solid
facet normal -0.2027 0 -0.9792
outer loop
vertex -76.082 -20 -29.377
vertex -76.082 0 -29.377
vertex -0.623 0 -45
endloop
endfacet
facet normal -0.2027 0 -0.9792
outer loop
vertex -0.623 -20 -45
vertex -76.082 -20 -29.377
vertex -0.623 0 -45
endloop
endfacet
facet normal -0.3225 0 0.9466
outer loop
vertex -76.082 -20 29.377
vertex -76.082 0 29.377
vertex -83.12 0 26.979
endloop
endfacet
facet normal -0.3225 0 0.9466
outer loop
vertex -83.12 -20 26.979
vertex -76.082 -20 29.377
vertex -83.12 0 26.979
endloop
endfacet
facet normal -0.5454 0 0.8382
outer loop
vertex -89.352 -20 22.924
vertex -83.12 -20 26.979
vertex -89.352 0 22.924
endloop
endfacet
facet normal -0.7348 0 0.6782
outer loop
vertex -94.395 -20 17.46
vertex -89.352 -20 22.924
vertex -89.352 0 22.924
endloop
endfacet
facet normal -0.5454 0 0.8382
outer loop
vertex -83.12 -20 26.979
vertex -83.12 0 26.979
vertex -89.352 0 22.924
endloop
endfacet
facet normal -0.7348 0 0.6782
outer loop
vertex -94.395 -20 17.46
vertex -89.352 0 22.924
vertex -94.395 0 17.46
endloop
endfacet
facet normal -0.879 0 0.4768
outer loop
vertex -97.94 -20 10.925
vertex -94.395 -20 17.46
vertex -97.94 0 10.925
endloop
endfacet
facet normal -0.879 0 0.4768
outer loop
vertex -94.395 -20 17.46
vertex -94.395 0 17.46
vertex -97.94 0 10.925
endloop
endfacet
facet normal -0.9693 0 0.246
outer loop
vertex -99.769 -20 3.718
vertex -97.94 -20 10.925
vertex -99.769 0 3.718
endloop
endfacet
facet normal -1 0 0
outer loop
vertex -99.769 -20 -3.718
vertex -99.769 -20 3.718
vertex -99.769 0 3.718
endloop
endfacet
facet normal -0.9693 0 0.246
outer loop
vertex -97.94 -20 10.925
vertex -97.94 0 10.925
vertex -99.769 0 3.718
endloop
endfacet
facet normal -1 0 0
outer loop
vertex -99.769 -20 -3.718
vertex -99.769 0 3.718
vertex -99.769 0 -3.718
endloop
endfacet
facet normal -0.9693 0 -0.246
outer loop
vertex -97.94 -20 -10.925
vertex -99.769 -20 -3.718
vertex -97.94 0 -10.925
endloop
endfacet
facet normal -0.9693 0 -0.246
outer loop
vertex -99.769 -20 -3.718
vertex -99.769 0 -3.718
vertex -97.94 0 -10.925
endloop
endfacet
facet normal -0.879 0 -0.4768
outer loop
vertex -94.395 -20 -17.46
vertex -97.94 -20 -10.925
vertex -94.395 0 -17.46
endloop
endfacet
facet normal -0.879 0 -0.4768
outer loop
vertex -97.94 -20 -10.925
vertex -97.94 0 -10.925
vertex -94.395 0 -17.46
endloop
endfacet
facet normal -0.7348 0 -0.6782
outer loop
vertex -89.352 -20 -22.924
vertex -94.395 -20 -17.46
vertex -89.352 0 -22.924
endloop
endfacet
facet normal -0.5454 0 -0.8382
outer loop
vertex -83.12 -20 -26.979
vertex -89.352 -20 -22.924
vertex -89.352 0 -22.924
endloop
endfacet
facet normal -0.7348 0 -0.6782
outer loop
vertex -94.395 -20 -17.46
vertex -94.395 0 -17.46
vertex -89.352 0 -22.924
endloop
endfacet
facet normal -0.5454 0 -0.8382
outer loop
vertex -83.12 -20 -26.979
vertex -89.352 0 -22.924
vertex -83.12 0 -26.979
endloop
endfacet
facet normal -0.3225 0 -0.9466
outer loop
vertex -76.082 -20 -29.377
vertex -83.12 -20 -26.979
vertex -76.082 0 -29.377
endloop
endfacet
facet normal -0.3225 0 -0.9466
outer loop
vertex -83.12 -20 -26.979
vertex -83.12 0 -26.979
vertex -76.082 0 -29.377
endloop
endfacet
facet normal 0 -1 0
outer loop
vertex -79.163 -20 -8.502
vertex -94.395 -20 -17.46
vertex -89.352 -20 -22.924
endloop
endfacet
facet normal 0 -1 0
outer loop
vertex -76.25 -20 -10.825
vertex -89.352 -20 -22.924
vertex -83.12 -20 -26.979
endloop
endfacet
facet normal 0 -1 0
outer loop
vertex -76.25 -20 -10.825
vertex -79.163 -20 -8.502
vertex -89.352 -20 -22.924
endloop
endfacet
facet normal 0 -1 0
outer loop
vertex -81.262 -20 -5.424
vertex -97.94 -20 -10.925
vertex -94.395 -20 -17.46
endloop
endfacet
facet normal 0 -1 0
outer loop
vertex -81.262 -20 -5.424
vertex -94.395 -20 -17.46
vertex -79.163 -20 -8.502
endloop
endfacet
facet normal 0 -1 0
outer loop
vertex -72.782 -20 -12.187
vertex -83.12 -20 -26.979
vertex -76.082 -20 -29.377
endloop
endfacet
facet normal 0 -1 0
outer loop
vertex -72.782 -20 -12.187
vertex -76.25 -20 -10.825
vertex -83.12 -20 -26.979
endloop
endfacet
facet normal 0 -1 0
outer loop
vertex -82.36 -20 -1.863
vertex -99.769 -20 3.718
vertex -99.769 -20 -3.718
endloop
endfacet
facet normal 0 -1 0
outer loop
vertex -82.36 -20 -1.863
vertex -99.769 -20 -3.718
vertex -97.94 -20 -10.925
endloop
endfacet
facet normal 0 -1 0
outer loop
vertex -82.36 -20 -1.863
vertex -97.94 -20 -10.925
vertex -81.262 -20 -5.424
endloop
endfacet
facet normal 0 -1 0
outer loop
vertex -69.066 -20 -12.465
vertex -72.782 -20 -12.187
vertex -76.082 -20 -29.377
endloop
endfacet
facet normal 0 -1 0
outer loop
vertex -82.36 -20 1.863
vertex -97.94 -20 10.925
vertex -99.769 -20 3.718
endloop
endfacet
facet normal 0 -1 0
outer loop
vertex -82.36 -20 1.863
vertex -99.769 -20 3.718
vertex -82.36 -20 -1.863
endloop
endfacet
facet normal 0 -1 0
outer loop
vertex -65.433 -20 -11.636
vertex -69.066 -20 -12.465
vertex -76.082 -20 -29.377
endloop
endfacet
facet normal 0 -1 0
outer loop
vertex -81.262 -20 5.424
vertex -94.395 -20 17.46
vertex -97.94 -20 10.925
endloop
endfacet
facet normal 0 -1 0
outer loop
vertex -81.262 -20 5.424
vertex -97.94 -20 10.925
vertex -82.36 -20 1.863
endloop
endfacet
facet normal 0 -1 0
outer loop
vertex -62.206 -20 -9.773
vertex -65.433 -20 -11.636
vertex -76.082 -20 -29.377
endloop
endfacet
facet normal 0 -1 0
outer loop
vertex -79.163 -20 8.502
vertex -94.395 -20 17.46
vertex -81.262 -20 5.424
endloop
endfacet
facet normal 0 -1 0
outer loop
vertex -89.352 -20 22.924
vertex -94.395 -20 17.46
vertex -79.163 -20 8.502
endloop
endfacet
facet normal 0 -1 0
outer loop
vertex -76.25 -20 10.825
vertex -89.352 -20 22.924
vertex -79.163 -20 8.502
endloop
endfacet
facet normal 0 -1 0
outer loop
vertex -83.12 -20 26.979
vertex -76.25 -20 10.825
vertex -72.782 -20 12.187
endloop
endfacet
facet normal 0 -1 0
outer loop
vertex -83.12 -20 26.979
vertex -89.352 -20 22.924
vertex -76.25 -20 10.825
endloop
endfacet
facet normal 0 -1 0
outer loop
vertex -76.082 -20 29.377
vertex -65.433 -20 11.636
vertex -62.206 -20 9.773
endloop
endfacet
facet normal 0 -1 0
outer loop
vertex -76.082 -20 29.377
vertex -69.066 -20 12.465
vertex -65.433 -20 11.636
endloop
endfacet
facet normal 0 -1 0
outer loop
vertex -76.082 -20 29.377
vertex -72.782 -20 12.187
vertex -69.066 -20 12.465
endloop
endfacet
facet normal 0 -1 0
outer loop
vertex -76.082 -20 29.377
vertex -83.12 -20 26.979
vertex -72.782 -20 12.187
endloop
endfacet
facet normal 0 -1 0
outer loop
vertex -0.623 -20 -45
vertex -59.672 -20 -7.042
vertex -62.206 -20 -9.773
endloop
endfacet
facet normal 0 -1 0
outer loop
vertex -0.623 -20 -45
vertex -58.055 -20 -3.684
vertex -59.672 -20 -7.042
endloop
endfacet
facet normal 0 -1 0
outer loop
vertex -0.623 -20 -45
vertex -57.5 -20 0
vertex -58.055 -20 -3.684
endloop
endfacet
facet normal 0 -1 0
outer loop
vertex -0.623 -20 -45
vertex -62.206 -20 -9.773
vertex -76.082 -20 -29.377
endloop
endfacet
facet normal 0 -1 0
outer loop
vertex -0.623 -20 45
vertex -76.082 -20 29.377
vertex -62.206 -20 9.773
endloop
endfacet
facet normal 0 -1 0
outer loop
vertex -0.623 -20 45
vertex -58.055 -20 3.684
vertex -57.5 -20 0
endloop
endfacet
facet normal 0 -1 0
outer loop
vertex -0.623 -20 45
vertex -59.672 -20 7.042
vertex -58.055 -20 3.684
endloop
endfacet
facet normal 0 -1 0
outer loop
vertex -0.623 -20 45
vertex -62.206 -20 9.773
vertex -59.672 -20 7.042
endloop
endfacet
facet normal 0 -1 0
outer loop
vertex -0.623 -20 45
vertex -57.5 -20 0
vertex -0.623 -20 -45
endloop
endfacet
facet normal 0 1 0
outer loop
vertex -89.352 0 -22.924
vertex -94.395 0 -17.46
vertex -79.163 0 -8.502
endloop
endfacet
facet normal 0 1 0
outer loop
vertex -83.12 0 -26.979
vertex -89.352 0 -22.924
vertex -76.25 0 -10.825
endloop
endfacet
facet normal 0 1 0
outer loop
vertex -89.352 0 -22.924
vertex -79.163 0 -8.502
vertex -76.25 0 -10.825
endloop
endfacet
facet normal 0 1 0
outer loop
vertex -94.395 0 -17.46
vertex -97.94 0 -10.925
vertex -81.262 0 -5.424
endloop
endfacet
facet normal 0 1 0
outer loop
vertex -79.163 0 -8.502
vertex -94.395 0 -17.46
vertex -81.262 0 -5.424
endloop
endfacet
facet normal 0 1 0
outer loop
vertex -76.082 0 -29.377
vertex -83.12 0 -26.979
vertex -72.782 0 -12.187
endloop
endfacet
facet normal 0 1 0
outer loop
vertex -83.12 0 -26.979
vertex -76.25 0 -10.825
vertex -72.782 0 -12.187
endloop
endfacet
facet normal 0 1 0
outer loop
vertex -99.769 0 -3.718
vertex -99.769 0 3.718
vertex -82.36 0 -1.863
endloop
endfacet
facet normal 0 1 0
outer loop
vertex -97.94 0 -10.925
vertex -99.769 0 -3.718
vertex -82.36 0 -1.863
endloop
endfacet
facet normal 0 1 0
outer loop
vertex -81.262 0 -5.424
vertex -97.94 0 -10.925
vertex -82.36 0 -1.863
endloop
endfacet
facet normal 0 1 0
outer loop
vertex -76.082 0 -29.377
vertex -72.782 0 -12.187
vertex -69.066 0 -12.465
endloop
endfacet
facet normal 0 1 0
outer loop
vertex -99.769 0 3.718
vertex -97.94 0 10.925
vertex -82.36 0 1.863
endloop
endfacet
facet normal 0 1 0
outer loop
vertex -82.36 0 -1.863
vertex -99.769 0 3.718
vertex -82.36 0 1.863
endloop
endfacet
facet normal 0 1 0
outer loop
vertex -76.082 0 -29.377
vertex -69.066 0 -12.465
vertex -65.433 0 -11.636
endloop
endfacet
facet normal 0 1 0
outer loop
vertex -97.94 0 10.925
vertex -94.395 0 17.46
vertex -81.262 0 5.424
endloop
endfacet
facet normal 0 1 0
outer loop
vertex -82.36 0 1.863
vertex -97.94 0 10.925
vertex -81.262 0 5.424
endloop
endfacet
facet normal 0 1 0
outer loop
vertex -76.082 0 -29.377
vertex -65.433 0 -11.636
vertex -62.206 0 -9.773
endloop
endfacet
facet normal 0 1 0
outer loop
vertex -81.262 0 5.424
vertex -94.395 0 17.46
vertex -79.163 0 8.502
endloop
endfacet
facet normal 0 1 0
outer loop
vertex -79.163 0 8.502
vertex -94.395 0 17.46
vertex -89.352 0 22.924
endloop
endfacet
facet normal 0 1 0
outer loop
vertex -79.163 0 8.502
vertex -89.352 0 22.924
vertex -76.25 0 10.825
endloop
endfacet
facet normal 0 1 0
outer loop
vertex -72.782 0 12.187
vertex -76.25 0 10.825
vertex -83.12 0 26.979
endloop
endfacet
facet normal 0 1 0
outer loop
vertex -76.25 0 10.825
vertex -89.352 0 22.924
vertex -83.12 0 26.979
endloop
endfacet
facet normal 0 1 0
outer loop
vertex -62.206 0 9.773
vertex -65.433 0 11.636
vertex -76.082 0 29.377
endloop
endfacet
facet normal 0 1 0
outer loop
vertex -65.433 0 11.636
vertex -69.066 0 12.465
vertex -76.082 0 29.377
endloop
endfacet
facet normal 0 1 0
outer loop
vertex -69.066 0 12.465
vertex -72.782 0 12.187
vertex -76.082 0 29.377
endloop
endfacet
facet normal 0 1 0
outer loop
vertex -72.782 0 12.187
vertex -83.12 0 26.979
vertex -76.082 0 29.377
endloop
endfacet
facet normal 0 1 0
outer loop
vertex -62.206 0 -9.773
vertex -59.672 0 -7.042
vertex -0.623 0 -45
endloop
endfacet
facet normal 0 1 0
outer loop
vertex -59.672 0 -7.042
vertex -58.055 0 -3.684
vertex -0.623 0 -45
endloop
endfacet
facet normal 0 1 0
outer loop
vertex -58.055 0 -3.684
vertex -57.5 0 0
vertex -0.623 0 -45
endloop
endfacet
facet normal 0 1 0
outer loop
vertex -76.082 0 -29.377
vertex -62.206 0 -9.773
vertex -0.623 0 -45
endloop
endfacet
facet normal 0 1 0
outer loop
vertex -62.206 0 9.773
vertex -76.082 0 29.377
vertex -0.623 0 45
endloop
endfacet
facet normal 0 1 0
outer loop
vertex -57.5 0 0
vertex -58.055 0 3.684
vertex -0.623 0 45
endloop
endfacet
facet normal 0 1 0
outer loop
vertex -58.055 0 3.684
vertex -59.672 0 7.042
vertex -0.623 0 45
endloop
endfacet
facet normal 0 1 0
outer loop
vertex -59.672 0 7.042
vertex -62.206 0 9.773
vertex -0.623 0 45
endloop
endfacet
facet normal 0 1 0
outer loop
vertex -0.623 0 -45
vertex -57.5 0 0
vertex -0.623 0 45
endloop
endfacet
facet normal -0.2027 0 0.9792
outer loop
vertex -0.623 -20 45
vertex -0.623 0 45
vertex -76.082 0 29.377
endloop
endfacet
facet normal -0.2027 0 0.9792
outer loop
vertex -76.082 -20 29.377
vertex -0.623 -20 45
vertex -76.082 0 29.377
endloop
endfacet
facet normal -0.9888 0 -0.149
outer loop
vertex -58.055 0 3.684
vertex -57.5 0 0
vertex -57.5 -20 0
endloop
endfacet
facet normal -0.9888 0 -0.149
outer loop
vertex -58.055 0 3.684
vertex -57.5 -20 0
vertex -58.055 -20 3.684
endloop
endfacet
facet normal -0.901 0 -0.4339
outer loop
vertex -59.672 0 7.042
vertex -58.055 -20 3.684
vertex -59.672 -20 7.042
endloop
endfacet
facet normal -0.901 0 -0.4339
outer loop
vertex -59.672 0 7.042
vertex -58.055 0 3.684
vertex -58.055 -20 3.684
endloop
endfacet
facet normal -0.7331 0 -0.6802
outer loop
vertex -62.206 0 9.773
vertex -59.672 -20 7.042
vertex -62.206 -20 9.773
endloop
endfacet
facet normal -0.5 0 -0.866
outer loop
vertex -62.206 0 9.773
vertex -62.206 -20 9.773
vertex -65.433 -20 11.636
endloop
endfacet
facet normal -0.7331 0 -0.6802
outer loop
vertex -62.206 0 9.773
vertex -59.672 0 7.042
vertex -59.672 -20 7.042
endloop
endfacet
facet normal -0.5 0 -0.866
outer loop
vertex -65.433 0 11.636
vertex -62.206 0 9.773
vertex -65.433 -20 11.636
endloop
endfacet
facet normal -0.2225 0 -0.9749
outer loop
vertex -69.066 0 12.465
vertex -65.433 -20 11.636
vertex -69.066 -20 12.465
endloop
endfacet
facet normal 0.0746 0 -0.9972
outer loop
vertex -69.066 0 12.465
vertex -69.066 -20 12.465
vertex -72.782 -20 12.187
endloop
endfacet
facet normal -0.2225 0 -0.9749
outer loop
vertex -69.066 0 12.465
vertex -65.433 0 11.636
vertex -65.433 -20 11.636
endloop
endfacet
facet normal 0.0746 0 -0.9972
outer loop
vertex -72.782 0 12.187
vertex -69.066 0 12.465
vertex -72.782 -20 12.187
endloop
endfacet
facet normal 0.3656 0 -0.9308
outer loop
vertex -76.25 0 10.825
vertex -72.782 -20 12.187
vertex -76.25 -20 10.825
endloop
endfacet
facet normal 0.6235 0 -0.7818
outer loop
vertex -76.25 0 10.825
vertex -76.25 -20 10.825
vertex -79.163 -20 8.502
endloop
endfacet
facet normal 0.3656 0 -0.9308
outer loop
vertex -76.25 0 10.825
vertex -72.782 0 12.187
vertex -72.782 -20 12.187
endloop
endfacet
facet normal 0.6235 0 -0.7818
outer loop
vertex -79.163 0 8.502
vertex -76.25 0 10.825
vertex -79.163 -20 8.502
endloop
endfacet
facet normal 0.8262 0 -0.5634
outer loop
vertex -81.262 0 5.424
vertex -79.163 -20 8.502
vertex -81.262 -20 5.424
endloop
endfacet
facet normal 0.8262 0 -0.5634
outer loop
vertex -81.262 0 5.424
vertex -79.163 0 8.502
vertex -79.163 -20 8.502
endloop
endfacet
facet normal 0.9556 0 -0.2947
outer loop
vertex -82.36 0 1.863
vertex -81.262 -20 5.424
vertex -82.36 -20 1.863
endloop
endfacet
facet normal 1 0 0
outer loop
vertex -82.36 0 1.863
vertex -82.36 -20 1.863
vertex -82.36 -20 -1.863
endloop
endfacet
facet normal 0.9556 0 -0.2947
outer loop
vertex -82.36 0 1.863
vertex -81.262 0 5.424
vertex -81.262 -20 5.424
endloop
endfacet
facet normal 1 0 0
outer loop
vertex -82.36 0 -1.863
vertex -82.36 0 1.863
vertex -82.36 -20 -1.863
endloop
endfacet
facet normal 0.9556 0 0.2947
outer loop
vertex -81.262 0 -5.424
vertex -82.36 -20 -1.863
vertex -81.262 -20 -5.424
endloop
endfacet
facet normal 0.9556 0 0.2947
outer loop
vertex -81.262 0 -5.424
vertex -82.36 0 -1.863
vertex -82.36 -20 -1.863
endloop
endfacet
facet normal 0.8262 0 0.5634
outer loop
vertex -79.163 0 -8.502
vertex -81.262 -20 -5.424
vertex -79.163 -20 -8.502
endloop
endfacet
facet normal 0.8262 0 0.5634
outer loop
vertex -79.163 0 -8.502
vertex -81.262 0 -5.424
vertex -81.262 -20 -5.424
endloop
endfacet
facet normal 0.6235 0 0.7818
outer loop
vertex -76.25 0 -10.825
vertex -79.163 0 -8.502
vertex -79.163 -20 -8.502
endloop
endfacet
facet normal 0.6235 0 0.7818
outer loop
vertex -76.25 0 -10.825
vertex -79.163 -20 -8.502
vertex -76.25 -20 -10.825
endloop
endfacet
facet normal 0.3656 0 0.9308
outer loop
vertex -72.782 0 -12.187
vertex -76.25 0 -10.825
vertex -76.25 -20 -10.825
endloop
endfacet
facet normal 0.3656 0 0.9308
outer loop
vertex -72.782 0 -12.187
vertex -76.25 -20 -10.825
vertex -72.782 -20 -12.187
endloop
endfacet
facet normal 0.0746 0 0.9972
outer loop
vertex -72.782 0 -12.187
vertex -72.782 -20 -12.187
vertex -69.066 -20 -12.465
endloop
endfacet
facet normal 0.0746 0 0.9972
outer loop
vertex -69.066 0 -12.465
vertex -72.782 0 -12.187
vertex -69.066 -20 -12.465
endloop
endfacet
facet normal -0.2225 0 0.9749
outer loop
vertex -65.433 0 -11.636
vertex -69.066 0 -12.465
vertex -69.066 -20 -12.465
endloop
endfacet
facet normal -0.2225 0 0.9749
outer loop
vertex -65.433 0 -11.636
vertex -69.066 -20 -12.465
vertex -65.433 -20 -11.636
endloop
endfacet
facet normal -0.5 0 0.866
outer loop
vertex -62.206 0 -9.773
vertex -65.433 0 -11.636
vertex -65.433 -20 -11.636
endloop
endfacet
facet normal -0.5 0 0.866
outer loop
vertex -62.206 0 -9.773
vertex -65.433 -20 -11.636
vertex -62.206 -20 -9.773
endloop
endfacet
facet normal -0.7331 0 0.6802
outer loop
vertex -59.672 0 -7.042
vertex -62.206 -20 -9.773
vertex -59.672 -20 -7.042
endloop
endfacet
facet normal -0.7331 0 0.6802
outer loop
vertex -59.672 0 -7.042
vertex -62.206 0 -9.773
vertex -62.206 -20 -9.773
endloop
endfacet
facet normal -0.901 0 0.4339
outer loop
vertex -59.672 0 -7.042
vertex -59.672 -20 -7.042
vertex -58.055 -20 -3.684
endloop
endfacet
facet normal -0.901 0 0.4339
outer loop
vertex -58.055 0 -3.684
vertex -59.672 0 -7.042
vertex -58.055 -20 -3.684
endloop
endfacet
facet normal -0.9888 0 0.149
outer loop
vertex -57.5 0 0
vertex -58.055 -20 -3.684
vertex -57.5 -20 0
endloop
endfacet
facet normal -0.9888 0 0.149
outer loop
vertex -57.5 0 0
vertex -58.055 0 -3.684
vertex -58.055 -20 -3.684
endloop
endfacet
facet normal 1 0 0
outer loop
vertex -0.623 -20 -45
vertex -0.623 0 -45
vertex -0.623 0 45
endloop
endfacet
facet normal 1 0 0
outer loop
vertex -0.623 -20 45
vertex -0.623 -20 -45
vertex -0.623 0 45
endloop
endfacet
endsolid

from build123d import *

# Parameters (mm, degrees)
F1_DEPTH = 20
F0_R     = 12.5
F2_DEPTH = 20


# Not quite as in the source:
# - a feature names something its author has since deleted; it is built from what else it names


with BuildPart() as f1:
    # F0 (on Front) → F1 (new body)
    with BuildSketch(Plane.XZ):
        with BuildLine():
            Line((-0.6229226271, -45), (-0.6229226271, 45))
            Line((-0.6229226271, 45), (-76.0821841814, 29.3769813899))
            ThreePointArc((-76.0821841814, 29.3769813899), (-51.0588480477, 23.2644097866), (-40, 0))
            ThreePointArc((-40, 0), (-51.0588480477, -23.2644097866), (-76.0821841814, -29.3769813899))
            Line((-76.0821841814, -29.3769813899), (-0.6229226271, -45))
        make_face()
    extrude(amount=F1_DEPTH)

    # F0 (on Front) → F2 (join)
    with BuildSketch(Plane.XZ):
        with BuildLine():
            ThreePointArc((-40, 0), (-51.0588480477, 23.2644097866), (-76.0821841814, 29.3769813899))
            ThreePointArc((-76.0821841814, 29.3769813899), (-100, 0), (-76.0821841814, -29.3769813899))
            ThreePointArc((-76.0821841814, -29.3769813899), (-51.0588480477, -23.2644097866), (-40, 0))
        make_face()
        with Locations((-70, 0)):
            Circle(F0_R, mode=Mode.SUBTRACT)
    extrude(amount=F2_DEPTH)


solid = f1.part
